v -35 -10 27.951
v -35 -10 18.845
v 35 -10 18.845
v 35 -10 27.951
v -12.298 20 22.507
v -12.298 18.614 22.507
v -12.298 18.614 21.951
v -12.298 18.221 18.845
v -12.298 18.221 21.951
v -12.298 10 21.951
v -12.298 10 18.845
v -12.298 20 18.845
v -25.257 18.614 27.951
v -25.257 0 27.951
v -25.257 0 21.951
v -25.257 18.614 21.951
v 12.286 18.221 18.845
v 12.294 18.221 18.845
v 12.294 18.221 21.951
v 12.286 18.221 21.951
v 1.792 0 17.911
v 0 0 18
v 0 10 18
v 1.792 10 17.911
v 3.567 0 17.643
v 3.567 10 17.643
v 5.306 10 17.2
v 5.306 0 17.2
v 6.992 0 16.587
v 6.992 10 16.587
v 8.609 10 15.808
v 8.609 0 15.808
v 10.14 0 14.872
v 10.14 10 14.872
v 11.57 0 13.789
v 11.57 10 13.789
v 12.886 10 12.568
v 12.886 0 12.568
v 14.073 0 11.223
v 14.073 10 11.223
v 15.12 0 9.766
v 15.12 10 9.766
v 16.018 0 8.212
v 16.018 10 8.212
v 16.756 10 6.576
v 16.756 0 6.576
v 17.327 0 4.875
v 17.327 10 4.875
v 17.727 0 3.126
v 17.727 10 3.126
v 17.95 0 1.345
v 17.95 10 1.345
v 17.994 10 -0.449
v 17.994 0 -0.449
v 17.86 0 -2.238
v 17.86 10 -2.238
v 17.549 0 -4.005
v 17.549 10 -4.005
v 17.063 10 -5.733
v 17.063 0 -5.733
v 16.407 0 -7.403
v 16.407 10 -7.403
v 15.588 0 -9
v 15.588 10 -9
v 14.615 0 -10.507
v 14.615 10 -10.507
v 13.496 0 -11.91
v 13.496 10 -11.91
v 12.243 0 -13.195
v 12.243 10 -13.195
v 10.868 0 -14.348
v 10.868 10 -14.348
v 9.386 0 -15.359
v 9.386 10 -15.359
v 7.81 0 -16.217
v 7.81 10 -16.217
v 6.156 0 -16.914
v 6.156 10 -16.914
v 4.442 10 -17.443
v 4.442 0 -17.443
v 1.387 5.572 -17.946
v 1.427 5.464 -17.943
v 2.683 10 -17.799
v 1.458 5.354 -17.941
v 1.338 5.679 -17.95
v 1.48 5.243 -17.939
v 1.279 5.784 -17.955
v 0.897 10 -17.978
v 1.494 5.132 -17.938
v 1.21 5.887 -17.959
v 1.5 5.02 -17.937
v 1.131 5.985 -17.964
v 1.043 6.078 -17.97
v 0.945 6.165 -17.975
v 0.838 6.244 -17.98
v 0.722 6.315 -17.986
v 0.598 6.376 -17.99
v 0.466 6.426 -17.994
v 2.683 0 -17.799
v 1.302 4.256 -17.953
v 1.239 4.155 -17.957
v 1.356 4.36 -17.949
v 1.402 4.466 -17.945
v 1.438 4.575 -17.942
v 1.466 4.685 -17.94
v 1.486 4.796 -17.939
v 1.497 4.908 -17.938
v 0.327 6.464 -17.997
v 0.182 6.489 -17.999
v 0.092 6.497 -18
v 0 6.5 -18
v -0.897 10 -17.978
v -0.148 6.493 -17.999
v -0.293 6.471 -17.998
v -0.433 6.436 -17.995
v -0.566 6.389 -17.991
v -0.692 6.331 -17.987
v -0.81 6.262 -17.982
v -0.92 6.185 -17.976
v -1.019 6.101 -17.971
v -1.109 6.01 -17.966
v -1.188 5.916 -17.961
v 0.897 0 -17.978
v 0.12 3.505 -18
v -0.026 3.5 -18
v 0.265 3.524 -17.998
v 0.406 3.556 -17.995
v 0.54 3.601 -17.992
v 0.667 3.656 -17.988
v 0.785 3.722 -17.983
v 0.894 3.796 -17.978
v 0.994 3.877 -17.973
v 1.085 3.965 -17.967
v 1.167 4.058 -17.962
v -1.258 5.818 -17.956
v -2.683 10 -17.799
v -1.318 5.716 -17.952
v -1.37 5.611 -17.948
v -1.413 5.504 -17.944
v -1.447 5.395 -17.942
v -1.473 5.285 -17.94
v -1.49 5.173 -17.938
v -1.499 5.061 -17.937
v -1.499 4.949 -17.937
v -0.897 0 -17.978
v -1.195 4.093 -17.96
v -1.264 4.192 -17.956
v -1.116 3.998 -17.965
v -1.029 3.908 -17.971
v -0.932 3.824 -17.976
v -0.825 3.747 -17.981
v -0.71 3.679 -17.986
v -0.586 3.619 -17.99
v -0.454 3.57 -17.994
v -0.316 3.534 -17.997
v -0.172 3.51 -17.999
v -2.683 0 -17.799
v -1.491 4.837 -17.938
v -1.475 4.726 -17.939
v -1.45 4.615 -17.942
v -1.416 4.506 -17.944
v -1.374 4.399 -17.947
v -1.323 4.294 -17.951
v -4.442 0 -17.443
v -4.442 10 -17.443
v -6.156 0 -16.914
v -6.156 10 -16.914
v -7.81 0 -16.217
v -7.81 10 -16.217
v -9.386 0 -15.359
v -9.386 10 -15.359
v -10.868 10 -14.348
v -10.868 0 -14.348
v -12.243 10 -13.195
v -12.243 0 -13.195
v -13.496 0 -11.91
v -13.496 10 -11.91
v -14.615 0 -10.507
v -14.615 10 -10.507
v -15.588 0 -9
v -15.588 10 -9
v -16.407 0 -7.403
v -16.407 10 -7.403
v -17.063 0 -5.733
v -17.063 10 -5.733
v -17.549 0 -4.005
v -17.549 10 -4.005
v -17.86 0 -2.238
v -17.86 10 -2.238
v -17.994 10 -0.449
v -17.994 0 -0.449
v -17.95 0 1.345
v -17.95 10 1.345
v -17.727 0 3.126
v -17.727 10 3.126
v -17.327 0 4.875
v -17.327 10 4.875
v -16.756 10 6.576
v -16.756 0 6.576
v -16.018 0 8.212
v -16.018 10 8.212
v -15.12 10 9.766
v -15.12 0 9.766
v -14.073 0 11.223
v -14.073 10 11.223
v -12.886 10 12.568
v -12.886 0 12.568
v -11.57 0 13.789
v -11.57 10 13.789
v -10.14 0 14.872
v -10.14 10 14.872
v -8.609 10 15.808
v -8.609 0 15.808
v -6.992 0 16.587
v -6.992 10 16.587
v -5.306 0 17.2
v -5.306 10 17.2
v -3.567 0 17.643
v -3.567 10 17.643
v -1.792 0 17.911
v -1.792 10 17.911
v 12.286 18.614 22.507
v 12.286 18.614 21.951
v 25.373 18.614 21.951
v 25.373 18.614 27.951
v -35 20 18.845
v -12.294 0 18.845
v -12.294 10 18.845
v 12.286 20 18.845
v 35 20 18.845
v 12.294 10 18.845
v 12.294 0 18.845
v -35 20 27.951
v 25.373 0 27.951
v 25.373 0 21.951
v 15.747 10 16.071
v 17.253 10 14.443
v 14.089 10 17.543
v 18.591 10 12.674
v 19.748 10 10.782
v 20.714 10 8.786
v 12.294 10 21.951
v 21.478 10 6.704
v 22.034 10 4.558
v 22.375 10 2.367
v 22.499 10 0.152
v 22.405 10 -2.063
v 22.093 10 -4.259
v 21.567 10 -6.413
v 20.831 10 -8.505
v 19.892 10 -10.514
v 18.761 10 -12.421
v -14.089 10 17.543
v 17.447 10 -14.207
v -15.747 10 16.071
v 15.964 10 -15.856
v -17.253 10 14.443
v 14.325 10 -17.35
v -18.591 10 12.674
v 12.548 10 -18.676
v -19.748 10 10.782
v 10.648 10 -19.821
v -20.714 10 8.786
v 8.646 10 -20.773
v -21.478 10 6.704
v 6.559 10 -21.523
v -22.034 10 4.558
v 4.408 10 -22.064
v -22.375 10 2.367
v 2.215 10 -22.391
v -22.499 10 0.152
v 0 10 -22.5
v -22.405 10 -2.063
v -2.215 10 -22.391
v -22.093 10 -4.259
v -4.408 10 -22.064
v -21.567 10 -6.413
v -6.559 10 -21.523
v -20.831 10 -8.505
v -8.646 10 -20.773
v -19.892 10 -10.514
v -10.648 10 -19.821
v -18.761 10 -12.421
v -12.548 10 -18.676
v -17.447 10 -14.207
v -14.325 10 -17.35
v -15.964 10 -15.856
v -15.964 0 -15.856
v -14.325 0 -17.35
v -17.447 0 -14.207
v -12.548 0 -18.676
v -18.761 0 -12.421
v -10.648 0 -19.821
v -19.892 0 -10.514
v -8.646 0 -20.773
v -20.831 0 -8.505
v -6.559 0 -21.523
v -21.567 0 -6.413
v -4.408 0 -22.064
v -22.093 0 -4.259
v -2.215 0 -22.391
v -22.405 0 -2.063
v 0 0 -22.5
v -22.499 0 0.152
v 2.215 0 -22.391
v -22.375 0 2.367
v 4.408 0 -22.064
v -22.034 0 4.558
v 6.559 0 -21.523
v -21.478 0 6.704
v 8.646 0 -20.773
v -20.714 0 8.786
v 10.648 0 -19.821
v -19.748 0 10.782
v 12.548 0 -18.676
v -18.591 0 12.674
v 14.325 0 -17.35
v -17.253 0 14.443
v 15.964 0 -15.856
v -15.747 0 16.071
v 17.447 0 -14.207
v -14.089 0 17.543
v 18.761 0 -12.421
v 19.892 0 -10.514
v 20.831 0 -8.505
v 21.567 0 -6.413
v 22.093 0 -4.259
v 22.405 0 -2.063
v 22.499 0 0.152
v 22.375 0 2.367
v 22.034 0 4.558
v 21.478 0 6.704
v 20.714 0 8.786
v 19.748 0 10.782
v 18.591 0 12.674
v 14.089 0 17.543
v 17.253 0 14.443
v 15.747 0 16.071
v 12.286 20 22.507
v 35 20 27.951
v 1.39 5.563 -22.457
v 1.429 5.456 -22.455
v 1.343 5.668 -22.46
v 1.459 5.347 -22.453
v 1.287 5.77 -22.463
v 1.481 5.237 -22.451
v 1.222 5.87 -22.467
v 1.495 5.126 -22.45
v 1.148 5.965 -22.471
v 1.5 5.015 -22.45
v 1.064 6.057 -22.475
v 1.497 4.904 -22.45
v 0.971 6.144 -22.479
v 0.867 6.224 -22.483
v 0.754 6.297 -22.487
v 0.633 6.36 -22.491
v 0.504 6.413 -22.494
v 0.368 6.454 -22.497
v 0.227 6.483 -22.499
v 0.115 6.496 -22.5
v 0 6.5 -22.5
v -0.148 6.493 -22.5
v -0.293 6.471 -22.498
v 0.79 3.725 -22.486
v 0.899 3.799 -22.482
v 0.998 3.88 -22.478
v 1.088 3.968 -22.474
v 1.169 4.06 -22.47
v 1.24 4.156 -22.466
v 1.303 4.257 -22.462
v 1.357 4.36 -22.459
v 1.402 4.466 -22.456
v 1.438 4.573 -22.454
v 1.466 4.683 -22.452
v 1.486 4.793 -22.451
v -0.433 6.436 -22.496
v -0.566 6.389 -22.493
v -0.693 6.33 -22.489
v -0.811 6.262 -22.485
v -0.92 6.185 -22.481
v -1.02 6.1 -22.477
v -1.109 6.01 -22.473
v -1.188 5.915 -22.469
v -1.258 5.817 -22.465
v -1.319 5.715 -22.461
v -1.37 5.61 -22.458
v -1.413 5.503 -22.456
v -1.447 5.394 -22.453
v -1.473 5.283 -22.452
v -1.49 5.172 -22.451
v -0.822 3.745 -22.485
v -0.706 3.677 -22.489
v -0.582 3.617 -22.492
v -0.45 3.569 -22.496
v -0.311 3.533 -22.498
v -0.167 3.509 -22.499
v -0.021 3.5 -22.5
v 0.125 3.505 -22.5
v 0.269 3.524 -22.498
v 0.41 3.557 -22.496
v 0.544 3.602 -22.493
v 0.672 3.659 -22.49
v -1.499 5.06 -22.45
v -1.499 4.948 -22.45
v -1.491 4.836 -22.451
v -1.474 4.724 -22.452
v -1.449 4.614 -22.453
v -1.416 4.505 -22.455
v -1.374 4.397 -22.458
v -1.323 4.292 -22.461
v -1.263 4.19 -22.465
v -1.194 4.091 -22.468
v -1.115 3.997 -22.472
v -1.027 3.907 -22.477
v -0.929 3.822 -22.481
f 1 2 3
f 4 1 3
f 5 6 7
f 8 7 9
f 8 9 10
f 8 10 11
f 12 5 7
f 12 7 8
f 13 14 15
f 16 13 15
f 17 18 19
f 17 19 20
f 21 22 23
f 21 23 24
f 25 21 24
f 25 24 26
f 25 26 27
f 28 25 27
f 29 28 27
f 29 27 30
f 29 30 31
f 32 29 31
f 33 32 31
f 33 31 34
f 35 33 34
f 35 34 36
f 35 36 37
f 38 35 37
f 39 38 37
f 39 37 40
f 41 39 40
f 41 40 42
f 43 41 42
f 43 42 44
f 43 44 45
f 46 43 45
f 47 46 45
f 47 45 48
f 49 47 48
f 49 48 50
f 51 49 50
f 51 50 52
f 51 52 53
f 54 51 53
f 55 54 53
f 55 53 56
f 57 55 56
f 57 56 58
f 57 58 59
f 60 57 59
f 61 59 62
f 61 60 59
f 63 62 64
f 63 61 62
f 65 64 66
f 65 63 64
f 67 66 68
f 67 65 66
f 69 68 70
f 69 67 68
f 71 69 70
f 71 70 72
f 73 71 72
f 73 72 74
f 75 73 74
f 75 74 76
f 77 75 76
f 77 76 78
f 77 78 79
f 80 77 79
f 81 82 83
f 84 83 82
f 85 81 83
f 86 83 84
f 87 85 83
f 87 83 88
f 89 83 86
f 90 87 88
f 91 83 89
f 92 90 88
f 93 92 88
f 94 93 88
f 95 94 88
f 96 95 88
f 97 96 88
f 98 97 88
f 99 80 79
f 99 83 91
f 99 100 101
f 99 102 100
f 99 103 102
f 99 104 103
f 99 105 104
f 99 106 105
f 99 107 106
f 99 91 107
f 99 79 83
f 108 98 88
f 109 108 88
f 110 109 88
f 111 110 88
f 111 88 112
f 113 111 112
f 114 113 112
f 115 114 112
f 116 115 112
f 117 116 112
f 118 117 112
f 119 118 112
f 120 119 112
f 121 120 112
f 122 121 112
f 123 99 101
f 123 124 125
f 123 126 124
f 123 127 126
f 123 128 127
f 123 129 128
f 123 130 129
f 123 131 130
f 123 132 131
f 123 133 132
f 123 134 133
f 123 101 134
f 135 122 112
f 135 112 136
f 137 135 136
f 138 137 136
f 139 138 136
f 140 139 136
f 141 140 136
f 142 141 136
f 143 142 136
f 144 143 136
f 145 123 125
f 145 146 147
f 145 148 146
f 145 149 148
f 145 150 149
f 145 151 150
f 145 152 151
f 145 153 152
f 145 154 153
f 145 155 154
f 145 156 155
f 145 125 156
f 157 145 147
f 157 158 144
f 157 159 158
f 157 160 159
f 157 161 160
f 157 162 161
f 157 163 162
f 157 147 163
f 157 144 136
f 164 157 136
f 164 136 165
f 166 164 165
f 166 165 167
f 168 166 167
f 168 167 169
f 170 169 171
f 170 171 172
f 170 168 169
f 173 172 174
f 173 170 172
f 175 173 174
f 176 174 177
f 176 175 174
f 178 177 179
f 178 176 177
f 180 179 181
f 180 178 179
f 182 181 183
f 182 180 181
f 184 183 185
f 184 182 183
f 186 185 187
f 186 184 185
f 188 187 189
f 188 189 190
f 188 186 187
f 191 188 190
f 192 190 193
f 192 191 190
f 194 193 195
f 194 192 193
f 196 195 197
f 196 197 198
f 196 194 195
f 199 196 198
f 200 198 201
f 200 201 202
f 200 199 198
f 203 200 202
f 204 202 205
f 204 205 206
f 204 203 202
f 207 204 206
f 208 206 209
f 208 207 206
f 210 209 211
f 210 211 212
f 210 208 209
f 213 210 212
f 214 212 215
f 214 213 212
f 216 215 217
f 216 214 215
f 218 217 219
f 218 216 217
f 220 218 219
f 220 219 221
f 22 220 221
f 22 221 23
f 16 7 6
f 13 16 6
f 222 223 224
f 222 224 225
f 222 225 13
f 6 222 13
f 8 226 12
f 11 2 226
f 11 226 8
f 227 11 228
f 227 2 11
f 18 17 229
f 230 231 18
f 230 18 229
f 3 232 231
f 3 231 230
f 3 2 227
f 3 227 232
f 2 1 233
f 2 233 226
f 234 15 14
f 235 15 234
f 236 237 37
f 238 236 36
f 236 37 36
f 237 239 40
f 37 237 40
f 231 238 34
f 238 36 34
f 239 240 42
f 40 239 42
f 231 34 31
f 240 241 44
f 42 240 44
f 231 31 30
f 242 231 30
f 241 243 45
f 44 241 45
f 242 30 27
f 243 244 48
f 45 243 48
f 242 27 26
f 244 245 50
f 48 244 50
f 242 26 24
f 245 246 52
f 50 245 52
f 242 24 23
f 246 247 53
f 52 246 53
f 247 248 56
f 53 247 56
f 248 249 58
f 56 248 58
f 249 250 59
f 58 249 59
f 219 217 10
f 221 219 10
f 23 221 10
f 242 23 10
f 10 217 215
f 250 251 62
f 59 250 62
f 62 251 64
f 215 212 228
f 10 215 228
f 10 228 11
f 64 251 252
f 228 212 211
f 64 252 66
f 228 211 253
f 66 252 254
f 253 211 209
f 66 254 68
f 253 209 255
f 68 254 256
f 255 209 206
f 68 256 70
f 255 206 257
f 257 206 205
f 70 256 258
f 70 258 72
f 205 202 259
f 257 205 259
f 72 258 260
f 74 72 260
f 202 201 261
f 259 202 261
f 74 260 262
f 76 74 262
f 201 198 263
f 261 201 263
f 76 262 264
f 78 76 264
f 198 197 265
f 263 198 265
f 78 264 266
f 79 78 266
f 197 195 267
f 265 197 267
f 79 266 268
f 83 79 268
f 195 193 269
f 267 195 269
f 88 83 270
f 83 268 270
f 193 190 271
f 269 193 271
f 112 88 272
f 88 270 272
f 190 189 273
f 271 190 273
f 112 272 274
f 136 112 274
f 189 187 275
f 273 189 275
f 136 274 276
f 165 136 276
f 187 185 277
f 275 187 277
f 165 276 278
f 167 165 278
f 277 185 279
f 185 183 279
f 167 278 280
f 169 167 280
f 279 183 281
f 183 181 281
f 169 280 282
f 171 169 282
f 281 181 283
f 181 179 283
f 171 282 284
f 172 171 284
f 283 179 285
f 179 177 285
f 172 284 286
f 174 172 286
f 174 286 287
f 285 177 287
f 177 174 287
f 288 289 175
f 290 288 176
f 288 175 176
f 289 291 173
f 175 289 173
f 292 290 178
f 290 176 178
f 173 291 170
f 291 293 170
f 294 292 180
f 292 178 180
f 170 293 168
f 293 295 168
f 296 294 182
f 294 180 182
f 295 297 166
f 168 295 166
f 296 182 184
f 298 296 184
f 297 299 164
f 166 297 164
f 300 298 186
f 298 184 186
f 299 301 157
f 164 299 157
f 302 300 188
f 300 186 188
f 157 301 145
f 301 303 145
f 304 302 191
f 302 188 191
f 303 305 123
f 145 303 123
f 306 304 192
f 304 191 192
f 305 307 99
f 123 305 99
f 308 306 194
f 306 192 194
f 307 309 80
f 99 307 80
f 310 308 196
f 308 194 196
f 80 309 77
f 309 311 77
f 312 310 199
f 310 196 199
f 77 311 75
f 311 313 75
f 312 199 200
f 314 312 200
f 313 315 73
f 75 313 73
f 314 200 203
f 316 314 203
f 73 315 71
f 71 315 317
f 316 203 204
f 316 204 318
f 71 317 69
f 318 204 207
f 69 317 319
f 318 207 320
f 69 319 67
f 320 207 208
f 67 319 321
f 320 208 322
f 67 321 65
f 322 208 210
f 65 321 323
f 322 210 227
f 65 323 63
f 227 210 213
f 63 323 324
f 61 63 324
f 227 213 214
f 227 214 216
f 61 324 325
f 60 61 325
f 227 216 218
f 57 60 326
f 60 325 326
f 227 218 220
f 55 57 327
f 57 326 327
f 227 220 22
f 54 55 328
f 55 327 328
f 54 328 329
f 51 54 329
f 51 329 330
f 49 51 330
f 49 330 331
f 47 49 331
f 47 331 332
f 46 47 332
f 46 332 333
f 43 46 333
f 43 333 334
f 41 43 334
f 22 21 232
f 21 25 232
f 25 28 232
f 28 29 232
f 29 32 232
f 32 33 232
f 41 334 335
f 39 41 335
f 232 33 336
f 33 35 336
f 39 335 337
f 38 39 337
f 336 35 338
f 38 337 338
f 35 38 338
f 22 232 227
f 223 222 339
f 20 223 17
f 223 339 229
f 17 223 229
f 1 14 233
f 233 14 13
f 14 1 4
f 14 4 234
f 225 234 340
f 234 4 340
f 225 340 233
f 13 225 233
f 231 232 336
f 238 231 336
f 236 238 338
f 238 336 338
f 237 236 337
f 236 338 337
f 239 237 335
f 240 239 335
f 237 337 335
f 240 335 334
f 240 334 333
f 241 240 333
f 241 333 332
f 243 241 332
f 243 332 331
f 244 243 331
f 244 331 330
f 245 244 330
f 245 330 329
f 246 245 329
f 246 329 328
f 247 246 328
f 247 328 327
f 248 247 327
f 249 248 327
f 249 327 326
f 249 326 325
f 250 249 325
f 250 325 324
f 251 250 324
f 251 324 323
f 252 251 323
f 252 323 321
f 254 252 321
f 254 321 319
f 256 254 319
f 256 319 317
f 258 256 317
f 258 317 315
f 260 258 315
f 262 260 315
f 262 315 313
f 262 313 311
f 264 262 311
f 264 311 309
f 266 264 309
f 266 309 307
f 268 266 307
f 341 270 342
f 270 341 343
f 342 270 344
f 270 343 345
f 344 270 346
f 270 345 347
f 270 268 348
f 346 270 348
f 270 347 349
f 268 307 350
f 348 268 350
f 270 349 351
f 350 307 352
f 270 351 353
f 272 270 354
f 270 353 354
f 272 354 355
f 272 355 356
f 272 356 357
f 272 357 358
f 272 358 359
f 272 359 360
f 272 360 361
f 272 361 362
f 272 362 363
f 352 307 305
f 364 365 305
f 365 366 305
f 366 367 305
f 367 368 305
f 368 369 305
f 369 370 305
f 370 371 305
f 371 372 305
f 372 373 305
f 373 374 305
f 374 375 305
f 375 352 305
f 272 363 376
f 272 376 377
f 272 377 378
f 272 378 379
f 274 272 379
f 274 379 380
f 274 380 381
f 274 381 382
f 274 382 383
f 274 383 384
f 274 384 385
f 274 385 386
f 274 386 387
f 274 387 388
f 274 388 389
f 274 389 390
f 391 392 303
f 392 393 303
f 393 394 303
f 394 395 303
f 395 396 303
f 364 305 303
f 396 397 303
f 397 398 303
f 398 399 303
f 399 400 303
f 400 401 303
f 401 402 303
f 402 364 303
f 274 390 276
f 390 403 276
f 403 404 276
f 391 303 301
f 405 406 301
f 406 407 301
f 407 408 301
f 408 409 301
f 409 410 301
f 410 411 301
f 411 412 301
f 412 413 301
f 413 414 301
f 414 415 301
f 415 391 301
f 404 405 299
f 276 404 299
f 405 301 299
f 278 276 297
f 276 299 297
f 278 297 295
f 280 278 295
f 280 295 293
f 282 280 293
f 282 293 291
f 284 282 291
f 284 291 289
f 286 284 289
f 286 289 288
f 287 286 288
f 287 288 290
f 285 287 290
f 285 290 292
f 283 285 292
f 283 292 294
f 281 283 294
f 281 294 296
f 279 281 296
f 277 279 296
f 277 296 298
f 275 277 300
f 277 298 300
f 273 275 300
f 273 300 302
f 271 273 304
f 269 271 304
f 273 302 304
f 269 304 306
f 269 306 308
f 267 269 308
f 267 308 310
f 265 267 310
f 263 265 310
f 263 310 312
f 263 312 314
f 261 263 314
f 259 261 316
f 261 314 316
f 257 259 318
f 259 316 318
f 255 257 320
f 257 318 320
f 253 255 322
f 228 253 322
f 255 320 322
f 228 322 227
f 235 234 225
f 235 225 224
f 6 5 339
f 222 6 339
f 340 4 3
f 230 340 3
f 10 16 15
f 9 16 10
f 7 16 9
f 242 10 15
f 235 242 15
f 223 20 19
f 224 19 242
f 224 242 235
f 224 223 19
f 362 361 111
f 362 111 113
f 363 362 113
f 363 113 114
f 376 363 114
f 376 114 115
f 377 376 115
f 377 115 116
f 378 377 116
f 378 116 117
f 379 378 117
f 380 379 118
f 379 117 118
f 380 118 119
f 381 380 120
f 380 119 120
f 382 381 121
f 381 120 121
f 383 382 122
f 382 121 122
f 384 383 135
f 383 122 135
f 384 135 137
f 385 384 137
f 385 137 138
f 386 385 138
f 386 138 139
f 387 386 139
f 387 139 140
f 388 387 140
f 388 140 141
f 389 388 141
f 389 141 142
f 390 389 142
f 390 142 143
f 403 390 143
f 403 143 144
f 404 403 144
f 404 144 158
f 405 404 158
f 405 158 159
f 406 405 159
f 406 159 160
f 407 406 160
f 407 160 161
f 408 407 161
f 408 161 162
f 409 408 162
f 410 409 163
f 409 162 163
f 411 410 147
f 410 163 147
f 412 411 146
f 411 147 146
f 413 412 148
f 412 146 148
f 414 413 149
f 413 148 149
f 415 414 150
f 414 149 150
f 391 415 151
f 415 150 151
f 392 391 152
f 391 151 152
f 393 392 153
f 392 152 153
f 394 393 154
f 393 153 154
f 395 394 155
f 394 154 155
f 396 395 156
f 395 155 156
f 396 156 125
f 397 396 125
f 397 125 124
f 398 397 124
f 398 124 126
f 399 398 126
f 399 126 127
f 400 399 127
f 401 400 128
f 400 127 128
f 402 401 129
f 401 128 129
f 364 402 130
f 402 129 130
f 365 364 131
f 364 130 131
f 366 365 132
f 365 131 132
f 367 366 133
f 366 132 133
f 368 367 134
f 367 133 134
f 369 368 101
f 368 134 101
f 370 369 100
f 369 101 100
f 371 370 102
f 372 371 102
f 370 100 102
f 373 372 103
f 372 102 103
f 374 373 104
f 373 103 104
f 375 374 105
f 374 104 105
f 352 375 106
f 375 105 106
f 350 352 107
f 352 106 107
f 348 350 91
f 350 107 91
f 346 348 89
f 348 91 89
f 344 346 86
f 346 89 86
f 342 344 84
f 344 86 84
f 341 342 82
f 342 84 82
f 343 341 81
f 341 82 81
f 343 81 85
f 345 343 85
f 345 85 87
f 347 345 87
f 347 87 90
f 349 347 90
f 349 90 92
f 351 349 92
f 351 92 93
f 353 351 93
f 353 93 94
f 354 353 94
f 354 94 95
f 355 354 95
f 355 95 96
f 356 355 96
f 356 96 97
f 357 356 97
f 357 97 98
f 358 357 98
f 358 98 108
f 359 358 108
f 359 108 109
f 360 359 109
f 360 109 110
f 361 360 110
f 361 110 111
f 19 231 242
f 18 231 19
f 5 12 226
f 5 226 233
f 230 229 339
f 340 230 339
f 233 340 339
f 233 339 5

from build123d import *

# Parameters (mm, degrees)
CROQUIS1_R                   = 22.5
CROQUIS1_R_2                 = 18
SALIENTE_EXTRUIR1_DEPTH      = 10
SALIENTE_EXTRUIR2_DEPTH      = 10
SALIENTE_EXTRUIR2_DEPTH_BACK = 20
CROQUIS3_W                   = 70
CROQUIS3_H                   = 9.106451256
CROQUIS5_R                   = 1.5
CORTAR_EXTRUIR1_DEPTH        = 50.053642187
CROQUIS7_W                   = 50
CROQUIS7_H                   = 10.485407271
CORTAR_EXTRUIR2_DEPTH        = 5
CROQUIS8_W                   = 50.630312491
CROQUIS8_H                   = 6
CORTAR_EXTRUIR3_DEPTH        = 20
CROQUIS11_W                  = 24.591659355
CROQUIS11_H                  = 8.221287074
CORTAR_EXTRUIR4_DEPTH        = 16
CROQUIS12_W                  = 6
CROQUIS12_H                  = 1.38614326
SALIENTE_EXTRUIR3_DEPTH      = 56
CROQUIS13_W                  = 24.583761772
CROQUIS13_H                  = 3.662244936
CORTAR_EXTRUIR5_DEPTH        = 5


with BuildPart() as part:
    # Croquis1 → Saliente-Extruir1 (new body)
    with BuildSketch(Plane(origin=(0, 0, 0), x_dir=(1, 0, 0), z_dir=(0, 1, 0))):
        with Locations(Location((0, 0, 0), (0, 0, 270))):
            Circle(CROQUIS1_R)
        with Locations(Location((0, 0, 0), (0, 0, 270))):
            Circle(CROQUIS1_R_2, mode=Mode.SUBTRACT)
    extrude(amount=SALIENTE_EXTRUIR1_DEPTH)

    # Croquis3 → Saliente-Extruir2 (add, two sides: drawn at the far end of the back side and taken through both)
    with BuildSketch(Plane(origin=(0, 10, 0), x_dir=(1, 0, 0), z_dir=(0, 1, 0)).offset(-SALIENTE_EXTRUIR2_DEPTH_BACK)):
        with Locations((0, -23.39779961)):
            Rectangle(CROQUIS3_W, CROQUIS3_H)
    extrude(amount=SALIENTE_EXTRUIR2_DEPTH + SALIENTE_EXTRUIR2_DEPTH_BACK)

    # Croquis5 → Cortar-Extruir1 (cut, through all)
    with BuildSketch(Plane.XY):
        with Locations(Location((0, 5, 0), (0, 0, 90))):
            Circle(CROQUIS5_R)
    extrude(amount=-CORTAR_EXTRUIR1_DEPTH, mode=Mode.SUBTRACT)

    # Croquis7 → Cortar-Extruir2 (cut)
    with BuildSketch(Plane.XY.offset(27.951025238)):
        with Locations((0, 6.110348598)):
            Rectangle(CROQUIS7_W, CROQUIS7_H)
    extrude(amount=-CORTAR_EXTRUIR2_DEPTH, mode=Mode.SUBTRACT)

    # Croquis8 → Cortar-Extruir3 (cut)
    with BuildSketch(Plane(origin=(0, 20, 0), x_dir=(1, 0, 0), z_dir=(0, 1, 0))):
        with Locations((0.058181837, -24.951025238)):
            Rectangle(CROQUIS8_W, CROQUIS8_H)
    extrude(amount=-CORTAR_EXTRUIR3_DEPTH, mode=Mode.SUBTRACT)

    # Croquis11 → Cortar-Extruir4 (cut)
    with BuildSketch(Plane(origin=(0, 0, 18.844573982), x_dir=(-1, 0, 0), z_dir=(0, 0, -1))):
        with Locations((0.00225284, 14.110643537)):
            Rectangle(CROQUIS11_W, CROQUIS11_H)
    extrude(amount=-CORTAR_EXTRUIR4_DEPTH, mode=Mode.SUBTRACT)

    # Croquis12 → Saliente-Extruir3 (add)
    with BuildSketch(Plane.ZY.offset(-25.373338083)):
        with Locations((24.951025238, 19.30692837)):
            Rectangle(CROQUIS12_W, CROQUIS12_H)
    extrude(amount=SALIENTE_EXTRUIR3_DEPTH)

    # Croquis13 → Cortar-Extruir5 (cut)
    with BuildSketch(Plane(origin=(0, 20, 0), x_dir=(1, 0, 0), z_dir=(0, 1, 0))):
        with Locations((-0.006201632, -20.67569645)):
            Rectangle(CROQUIS13_W, CROQUIS13_H)
    extrude(amount=-CORTAR_EXTRUIR5_DEPTH, mode=Mode.SUBTRACT)


solid = part.part
